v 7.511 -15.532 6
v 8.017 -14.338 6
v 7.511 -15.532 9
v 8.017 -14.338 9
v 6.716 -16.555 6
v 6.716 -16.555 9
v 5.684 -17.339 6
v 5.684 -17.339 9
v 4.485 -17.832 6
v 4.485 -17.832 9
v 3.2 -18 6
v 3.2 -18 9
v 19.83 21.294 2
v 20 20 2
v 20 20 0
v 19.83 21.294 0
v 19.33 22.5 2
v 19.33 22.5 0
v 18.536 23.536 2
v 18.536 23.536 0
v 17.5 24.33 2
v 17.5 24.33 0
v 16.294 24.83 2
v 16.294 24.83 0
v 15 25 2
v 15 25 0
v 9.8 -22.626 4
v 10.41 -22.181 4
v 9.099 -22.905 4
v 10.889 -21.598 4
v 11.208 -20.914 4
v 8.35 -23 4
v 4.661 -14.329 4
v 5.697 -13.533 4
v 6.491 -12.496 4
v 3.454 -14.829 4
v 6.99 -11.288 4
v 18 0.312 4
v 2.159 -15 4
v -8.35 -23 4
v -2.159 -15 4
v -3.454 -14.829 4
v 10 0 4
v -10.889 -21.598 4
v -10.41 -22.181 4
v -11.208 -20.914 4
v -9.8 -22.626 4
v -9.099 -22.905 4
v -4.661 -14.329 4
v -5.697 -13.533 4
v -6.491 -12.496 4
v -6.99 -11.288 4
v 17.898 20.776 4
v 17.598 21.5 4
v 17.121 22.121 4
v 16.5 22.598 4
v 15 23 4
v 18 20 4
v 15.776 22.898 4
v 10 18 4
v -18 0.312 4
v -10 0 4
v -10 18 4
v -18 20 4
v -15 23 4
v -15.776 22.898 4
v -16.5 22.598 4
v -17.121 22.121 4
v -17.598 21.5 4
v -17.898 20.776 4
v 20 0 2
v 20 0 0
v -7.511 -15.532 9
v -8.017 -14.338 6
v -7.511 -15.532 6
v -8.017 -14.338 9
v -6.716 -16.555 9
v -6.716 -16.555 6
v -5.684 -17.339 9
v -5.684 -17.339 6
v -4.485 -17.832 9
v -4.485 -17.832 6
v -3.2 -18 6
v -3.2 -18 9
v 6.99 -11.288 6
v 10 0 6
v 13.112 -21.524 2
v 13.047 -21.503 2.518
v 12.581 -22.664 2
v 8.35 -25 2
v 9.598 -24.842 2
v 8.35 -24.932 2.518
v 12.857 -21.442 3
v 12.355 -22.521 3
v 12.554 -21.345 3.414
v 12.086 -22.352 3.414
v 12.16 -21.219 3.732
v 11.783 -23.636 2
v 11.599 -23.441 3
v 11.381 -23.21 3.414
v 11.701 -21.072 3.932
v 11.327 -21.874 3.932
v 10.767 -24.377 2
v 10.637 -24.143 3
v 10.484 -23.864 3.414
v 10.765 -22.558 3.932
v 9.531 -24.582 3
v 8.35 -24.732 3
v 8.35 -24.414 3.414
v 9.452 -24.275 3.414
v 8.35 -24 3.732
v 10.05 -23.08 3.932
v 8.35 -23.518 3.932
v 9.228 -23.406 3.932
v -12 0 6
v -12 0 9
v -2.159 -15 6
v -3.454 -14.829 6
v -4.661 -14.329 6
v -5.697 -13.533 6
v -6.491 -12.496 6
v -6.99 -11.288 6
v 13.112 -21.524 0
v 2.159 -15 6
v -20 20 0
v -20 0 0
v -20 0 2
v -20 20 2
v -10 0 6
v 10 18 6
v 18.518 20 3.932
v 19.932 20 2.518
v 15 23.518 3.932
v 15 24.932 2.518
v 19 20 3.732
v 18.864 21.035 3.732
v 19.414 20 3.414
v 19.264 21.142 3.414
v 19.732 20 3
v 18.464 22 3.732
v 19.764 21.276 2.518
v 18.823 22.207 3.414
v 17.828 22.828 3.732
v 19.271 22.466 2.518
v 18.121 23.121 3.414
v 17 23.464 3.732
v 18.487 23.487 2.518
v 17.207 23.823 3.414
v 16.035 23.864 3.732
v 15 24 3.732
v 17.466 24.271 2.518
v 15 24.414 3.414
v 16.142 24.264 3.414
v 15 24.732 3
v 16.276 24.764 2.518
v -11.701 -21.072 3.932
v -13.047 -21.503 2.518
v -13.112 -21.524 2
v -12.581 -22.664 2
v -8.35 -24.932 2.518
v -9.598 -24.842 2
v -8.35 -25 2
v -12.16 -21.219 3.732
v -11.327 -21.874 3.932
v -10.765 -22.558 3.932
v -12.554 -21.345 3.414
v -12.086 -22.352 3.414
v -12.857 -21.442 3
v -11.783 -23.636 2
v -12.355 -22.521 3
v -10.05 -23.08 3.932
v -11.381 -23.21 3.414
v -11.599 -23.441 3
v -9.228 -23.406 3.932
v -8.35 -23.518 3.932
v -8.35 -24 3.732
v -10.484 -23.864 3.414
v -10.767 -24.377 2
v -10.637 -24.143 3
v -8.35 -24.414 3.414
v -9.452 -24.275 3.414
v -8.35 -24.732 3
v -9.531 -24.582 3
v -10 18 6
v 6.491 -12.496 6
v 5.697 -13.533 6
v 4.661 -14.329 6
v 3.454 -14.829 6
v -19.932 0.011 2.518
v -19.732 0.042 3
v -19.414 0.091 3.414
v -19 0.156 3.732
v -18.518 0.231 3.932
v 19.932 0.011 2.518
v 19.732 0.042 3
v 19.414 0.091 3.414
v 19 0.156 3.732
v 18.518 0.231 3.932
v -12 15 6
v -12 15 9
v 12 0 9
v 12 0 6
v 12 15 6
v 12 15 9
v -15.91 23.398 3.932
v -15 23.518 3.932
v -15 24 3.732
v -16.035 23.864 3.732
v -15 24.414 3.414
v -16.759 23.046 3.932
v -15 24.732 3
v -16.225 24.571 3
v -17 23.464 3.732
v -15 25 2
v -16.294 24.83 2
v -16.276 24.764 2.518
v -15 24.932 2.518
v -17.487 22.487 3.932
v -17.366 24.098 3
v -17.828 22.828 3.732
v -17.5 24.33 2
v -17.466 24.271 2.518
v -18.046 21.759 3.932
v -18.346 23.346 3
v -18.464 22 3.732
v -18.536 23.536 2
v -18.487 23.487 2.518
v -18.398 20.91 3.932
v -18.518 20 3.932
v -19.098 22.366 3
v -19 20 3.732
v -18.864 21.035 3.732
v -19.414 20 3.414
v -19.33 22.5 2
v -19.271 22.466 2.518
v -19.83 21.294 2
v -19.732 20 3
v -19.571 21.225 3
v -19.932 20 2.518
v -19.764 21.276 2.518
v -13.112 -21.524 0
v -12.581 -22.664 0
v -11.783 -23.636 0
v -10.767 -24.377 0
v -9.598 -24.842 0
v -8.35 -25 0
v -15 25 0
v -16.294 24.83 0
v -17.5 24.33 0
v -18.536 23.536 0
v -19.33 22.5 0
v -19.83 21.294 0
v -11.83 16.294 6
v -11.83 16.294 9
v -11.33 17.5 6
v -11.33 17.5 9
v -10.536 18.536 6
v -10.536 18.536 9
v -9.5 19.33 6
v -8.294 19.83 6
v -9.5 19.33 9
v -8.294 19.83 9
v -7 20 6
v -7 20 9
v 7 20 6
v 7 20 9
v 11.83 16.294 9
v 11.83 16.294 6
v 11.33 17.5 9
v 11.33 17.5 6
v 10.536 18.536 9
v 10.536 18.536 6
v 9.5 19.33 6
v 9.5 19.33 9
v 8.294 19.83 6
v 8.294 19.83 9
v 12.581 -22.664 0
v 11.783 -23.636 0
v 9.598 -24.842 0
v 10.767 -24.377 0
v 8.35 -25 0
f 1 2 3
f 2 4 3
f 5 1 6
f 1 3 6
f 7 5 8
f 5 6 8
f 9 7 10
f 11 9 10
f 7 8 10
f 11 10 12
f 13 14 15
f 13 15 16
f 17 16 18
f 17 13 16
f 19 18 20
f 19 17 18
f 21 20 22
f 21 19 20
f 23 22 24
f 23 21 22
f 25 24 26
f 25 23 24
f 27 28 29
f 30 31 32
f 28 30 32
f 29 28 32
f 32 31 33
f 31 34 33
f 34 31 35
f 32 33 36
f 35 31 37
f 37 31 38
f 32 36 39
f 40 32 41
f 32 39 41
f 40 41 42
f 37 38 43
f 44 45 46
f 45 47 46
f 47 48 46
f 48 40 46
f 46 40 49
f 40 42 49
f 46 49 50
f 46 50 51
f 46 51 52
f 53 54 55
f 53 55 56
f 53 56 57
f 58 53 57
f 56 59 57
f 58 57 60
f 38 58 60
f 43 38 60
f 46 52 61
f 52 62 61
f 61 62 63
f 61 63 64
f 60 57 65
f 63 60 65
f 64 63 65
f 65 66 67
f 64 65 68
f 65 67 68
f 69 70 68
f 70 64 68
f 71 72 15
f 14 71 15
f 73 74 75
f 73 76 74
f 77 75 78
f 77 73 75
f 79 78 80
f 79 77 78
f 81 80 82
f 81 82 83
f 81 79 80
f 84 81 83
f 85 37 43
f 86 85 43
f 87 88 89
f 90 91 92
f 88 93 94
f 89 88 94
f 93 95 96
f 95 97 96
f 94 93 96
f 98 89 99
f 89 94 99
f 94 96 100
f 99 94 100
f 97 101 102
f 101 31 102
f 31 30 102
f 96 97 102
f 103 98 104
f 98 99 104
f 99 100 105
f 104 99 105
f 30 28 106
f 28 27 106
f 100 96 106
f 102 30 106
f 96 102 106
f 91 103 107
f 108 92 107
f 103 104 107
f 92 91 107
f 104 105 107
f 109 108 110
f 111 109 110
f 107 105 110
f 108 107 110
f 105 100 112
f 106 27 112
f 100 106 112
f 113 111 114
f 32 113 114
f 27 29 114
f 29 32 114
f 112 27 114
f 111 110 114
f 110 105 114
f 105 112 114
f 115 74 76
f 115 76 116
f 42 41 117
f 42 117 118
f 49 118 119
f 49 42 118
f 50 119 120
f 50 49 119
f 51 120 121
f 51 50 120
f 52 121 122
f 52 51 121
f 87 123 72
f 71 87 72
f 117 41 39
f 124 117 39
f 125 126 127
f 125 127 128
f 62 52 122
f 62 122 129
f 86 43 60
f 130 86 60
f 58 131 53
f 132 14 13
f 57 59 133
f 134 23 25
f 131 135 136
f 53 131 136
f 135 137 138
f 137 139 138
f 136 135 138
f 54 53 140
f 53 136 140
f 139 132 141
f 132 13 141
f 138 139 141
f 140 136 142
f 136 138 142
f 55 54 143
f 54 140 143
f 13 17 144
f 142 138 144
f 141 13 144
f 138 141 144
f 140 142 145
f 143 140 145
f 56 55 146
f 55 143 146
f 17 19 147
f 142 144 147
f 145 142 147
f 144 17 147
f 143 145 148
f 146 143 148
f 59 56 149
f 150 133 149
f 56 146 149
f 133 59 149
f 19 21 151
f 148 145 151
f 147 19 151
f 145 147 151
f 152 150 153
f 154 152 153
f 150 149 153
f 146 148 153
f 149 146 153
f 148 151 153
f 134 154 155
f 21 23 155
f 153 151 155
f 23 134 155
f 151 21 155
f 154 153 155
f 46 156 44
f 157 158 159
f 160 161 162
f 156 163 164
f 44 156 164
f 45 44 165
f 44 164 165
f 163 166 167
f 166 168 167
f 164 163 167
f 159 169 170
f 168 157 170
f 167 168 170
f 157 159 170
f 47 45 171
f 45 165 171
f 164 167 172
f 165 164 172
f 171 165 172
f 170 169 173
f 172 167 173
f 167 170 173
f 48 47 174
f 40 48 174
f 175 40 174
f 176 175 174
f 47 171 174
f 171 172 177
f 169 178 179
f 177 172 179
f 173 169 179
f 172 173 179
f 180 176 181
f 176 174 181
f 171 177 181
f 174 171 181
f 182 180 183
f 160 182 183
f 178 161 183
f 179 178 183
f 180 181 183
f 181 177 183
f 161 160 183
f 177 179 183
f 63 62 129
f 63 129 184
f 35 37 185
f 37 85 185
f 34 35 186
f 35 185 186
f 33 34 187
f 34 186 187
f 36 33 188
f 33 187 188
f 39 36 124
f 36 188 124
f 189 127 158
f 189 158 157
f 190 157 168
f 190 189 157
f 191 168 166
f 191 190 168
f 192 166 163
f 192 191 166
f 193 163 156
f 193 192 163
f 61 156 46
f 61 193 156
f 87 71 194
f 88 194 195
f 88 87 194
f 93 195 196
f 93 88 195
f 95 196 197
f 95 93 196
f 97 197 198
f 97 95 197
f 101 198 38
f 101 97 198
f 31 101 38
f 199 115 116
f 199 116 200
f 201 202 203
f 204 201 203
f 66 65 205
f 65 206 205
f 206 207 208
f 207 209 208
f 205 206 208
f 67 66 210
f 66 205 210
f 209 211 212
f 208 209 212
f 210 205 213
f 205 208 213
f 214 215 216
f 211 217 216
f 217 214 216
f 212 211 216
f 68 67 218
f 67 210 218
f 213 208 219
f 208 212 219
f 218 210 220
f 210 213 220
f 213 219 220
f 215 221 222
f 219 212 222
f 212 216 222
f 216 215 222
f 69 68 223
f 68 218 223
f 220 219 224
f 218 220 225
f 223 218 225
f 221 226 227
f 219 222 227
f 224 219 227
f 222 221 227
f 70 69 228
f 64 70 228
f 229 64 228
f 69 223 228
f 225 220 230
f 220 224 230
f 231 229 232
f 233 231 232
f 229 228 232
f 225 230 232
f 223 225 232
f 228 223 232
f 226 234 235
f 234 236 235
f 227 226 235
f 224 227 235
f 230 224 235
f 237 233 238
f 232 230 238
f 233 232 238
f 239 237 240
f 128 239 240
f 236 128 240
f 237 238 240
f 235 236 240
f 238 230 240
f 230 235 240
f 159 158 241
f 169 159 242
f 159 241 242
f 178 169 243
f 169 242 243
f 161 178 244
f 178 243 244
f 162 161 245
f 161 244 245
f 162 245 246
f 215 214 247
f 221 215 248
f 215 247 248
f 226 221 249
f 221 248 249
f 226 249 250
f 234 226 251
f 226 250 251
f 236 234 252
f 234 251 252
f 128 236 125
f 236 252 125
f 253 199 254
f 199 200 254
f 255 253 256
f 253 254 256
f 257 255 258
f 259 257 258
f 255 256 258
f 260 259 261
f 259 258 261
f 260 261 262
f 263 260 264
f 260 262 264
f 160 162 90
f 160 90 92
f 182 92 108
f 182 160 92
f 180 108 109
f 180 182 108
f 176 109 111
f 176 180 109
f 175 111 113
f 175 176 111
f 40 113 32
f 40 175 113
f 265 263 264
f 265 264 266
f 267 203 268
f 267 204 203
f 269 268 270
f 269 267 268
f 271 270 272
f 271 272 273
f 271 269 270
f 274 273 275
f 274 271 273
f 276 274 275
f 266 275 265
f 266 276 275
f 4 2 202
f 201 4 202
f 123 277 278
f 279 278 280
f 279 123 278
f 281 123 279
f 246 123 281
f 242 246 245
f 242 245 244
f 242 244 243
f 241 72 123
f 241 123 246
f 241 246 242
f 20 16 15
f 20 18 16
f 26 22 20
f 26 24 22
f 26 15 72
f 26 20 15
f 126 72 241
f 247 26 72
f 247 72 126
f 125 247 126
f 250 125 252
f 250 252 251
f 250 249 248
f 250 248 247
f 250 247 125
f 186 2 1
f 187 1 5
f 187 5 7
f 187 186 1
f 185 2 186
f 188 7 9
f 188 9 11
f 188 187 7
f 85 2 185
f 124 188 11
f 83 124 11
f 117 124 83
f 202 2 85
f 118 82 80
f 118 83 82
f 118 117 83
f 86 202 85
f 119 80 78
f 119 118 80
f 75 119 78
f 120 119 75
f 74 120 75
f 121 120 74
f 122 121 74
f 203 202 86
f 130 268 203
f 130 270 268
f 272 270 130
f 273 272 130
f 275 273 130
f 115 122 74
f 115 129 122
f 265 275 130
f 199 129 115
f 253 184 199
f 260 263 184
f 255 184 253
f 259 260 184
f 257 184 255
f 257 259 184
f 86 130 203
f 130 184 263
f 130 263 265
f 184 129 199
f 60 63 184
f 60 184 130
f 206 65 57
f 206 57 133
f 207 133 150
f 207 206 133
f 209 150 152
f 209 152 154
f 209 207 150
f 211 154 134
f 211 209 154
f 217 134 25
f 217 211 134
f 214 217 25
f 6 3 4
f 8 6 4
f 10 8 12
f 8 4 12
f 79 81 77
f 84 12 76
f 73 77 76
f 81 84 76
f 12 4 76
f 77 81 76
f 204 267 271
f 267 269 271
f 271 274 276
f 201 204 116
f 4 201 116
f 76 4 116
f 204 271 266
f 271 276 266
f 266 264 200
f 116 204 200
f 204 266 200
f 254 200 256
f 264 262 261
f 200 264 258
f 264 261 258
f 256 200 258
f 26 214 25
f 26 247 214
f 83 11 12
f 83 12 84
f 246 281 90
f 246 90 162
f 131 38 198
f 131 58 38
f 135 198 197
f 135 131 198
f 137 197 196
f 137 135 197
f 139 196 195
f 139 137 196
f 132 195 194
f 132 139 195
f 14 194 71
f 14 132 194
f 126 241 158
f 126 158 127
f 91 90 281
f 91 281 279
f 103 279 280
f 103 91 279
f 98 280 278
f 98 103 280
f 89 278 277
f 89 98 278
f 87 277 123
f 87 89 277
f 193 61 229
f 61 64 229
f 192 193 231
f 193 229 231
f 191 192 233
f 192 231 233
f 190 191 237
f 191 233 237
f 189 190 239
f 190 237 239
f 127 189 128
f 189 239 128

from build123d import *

# Parameters (mm, degrees)
F1_DEPTH        = 4
F2_R            = 5
F3_R            = 2
F5_DEPTH        = 6
F6_R            = 5
F8_DEPTH        = 3
F10_F1_R        = 5
F10_F2_R        = 5
F10_2_T1_DEPTH  = 11.6034789136
F10_2_T3_DEPTH  = 16.5
F10_2_T5_DEPTH  = 13.1244047484
F10_2_T8_ANGLE  = 72.2553283749
F10_2_T10_ANGLE = 90


# Not quite as in the source:
# - a fillet or chamfer that OpenCascade refuses, or shapes differently, is made with other operations: its cross-section is extruded or revolved along the edge and cut away or added
# - a pattern or mirror of a feature is missing from the dataset's text; its kind, count and spacing are read off the source's solid


with BuildPart() as f1:
    # F0 (on Top) → F1 (new body)
    with BuildSketch(Plane.XY):
        Polygon((0, 25), (0, 0), (0, -25), (12, -25), (20, 0), (20, 25), align=None)
    extrude(amount=F1_DEPTH)

    # F1_copies: F1 across plane


with BuildPart() as f1_1:
    add(f1.part)
    add(f1.part.mirror(Plane(origin=(0, 0, 0), x_dir=(0, 0, -1), z_dir=(-1, 0, 0))))

    # F2
    f2_edges = [f1_1.edges().sort_by_distance(p)[0] for p in [
        (12, -25, 2),
        (20, 25, 2),
    ]]
    fillet(f2_edges, radius=F2_R)

    # F3
    f3_edges = [f1_1.edges().sort_by_distance(p)[0] for p in [
        (-1.824881, -25, 4),
        (20, 10, 4),
        (11.29817, -24.038527, 4),
        (-16, -12.5, 4),
        (16.556179, -10.761939, 4),
        (-20, 12.5, 4),
        (-2.5, 25, 4),
        (18.535534, 23.535534, 4),
    ]]
    fillet(f3_edges, radius=F3_R)

    # F4 (on Top) → F5 (join)
    with BuildSketch(Plane.XY):
        Polygon((0, 18), (0, 0), (0, -15), (6, -15), (10, 0), (10, 18), align=None)
    f5 = extrude(amount=F5_DEPTH)

    # F5_copies: F5 across plane
    add(f5.mirror(Plane(origin=(0, 0, 0), x_dir=(0, 0, -1), z_dir=(-1, 0, 0))))

    # F6
    f6_edges = [f1_1.edges().sort_by_distance(p)[0] for p in [
        (6, -15, 5),
    ]]
    fillet(f6_edges, radius=F6_R)

    # F10#2: fillet of radius 5 on 3 edges, made by hand

    # F10_2_s2 → F10_2_t1 (cut)
    with BuildSketch(Plane.XY.offset(4)):
        with BuildLine():
            ThreePointArc((-2.1586084346, -15), (-5.2047891364, -13.9649442785), (-6.9897831326, -11.2883132528))
            Line((-6.9897831326, -11.2883132528), (-6, -15))
            Line((-6, -15), (-2.1586084346, -15))
        make_face()
    extrude(amount=F10_2_T1_DEPTH, mode=Mode.SUBTRACT)

    # F10_2_s4 → F10_2_t3 (cut)
    with BuildSketch(Plane.XY.offset(-12.5)):
        with BuildLine():
            ThreePointArc((-15, 25), (-18.5355339059, 23.5355339059), (-20, 20))
            Line((-20, 20), (-20, 25))
            Line((-20, 25), (-15, 25))
        make_face()
    extrude(amount=F10_2_T3_DEPTH, mode=Mode.SUBTRACT)

    # F10_2_s6 → F10_2_t5 (cut)
    with BuildSketch(Plane.XY.offset(-9.1244047484)):
        with BuildLine():
            ThreePointArc((-13.1123588366, -21.5238786355), (-11.2981701574, -24.0385265368), (-8.3502381006, -25))
            Line((-8.3502381006, -25), (-12, -25))
            Line((-12, -25), (-13.1123588366, -21.5238786355))
        make_face()
    extrude(amount=F10_2_T5_DEPTH, mode=Mode.SUBTRACT)

    # F10_2_s7 → F10_2_t8 (revolve, cut)
    with BuildSketch(Plane(origin=(5.0298762867, -15.718363396, 0), x_dir=(0, 0, 1), z_dir=(-0.3047757271, 0.9524241472, 0))):
        with BuildLine():
            ThreePointArc((4, -17.048482944), (3.4142135624, -18.4626965064), (2, -19.048482944))
            Line((2, -19.048482944), (4, -19.048482944))
            Line((4, -19.048482944), (4, -17.048482944))
        make_face()
    revolve(axis=Axis((-8.3502381006, -20, 4), (0, 0, 1)), revolution_arc=F10_2_T8_ANGLE, mode=Mode.SUBTRACT)

    # F10_2_s9 → F10_2_t10 (revolve, cut)
    with BuildSketch(Plane.YZ.offset(-15)):
        with BuildLine():
            ThreePointArc((23, 4), (24.4142135624, 3.4142135624), (25, 2))
            Line((25, 2), (25, 4))
            Line((25, 4), (23, 4))
        make_face()
    revolve(axis=Axis((-15, 20, 4), (0, 0, 1)), revolution_arc=F10_2_T10_ANGLE, mode=Mode.SUBTRACT)



with BuildPart() as f8:
    # F7 (on Top) → F8 (new body)
    with BuildSketch(Plane.XY):
        Polygon((0, 20), (0, 0), (0, -18), (7, -18), (12, 0), (12, 20), align=None)
    extrude(amount=F8_DEPTH)


with BuildPart() as f8_1:
    # F9: moved
    add(f8.part.moved(Location((0, 0, 6))))

    # F10: fillet of radius 5 on 2 edges, made by hand

    # F10_f1
    f10_f1_edges = [f8_1.edges().sort_by_distance(p)[0] for p in [
        (12, 20, 7.5),
    ]]
    fillet(f10_f1_edges, radius=F10_F1_R)

    # F10_f2
    f10_f2_edges = [f8_1.edges().sort_by_distance(p)[0] for p in [
        (7, -18, 7.5),
    ]]
    fillet(f10_f2_edges, radius=F10_F2_R)


with BuildPart() as f1_2:
    add(f1_1.part)

    add(f8_1.part)  # F11 merges F8
    # F11: F8 across plane
    add(f8_1.part.mirror(Plane.YZ))


solid = f1_2.part
